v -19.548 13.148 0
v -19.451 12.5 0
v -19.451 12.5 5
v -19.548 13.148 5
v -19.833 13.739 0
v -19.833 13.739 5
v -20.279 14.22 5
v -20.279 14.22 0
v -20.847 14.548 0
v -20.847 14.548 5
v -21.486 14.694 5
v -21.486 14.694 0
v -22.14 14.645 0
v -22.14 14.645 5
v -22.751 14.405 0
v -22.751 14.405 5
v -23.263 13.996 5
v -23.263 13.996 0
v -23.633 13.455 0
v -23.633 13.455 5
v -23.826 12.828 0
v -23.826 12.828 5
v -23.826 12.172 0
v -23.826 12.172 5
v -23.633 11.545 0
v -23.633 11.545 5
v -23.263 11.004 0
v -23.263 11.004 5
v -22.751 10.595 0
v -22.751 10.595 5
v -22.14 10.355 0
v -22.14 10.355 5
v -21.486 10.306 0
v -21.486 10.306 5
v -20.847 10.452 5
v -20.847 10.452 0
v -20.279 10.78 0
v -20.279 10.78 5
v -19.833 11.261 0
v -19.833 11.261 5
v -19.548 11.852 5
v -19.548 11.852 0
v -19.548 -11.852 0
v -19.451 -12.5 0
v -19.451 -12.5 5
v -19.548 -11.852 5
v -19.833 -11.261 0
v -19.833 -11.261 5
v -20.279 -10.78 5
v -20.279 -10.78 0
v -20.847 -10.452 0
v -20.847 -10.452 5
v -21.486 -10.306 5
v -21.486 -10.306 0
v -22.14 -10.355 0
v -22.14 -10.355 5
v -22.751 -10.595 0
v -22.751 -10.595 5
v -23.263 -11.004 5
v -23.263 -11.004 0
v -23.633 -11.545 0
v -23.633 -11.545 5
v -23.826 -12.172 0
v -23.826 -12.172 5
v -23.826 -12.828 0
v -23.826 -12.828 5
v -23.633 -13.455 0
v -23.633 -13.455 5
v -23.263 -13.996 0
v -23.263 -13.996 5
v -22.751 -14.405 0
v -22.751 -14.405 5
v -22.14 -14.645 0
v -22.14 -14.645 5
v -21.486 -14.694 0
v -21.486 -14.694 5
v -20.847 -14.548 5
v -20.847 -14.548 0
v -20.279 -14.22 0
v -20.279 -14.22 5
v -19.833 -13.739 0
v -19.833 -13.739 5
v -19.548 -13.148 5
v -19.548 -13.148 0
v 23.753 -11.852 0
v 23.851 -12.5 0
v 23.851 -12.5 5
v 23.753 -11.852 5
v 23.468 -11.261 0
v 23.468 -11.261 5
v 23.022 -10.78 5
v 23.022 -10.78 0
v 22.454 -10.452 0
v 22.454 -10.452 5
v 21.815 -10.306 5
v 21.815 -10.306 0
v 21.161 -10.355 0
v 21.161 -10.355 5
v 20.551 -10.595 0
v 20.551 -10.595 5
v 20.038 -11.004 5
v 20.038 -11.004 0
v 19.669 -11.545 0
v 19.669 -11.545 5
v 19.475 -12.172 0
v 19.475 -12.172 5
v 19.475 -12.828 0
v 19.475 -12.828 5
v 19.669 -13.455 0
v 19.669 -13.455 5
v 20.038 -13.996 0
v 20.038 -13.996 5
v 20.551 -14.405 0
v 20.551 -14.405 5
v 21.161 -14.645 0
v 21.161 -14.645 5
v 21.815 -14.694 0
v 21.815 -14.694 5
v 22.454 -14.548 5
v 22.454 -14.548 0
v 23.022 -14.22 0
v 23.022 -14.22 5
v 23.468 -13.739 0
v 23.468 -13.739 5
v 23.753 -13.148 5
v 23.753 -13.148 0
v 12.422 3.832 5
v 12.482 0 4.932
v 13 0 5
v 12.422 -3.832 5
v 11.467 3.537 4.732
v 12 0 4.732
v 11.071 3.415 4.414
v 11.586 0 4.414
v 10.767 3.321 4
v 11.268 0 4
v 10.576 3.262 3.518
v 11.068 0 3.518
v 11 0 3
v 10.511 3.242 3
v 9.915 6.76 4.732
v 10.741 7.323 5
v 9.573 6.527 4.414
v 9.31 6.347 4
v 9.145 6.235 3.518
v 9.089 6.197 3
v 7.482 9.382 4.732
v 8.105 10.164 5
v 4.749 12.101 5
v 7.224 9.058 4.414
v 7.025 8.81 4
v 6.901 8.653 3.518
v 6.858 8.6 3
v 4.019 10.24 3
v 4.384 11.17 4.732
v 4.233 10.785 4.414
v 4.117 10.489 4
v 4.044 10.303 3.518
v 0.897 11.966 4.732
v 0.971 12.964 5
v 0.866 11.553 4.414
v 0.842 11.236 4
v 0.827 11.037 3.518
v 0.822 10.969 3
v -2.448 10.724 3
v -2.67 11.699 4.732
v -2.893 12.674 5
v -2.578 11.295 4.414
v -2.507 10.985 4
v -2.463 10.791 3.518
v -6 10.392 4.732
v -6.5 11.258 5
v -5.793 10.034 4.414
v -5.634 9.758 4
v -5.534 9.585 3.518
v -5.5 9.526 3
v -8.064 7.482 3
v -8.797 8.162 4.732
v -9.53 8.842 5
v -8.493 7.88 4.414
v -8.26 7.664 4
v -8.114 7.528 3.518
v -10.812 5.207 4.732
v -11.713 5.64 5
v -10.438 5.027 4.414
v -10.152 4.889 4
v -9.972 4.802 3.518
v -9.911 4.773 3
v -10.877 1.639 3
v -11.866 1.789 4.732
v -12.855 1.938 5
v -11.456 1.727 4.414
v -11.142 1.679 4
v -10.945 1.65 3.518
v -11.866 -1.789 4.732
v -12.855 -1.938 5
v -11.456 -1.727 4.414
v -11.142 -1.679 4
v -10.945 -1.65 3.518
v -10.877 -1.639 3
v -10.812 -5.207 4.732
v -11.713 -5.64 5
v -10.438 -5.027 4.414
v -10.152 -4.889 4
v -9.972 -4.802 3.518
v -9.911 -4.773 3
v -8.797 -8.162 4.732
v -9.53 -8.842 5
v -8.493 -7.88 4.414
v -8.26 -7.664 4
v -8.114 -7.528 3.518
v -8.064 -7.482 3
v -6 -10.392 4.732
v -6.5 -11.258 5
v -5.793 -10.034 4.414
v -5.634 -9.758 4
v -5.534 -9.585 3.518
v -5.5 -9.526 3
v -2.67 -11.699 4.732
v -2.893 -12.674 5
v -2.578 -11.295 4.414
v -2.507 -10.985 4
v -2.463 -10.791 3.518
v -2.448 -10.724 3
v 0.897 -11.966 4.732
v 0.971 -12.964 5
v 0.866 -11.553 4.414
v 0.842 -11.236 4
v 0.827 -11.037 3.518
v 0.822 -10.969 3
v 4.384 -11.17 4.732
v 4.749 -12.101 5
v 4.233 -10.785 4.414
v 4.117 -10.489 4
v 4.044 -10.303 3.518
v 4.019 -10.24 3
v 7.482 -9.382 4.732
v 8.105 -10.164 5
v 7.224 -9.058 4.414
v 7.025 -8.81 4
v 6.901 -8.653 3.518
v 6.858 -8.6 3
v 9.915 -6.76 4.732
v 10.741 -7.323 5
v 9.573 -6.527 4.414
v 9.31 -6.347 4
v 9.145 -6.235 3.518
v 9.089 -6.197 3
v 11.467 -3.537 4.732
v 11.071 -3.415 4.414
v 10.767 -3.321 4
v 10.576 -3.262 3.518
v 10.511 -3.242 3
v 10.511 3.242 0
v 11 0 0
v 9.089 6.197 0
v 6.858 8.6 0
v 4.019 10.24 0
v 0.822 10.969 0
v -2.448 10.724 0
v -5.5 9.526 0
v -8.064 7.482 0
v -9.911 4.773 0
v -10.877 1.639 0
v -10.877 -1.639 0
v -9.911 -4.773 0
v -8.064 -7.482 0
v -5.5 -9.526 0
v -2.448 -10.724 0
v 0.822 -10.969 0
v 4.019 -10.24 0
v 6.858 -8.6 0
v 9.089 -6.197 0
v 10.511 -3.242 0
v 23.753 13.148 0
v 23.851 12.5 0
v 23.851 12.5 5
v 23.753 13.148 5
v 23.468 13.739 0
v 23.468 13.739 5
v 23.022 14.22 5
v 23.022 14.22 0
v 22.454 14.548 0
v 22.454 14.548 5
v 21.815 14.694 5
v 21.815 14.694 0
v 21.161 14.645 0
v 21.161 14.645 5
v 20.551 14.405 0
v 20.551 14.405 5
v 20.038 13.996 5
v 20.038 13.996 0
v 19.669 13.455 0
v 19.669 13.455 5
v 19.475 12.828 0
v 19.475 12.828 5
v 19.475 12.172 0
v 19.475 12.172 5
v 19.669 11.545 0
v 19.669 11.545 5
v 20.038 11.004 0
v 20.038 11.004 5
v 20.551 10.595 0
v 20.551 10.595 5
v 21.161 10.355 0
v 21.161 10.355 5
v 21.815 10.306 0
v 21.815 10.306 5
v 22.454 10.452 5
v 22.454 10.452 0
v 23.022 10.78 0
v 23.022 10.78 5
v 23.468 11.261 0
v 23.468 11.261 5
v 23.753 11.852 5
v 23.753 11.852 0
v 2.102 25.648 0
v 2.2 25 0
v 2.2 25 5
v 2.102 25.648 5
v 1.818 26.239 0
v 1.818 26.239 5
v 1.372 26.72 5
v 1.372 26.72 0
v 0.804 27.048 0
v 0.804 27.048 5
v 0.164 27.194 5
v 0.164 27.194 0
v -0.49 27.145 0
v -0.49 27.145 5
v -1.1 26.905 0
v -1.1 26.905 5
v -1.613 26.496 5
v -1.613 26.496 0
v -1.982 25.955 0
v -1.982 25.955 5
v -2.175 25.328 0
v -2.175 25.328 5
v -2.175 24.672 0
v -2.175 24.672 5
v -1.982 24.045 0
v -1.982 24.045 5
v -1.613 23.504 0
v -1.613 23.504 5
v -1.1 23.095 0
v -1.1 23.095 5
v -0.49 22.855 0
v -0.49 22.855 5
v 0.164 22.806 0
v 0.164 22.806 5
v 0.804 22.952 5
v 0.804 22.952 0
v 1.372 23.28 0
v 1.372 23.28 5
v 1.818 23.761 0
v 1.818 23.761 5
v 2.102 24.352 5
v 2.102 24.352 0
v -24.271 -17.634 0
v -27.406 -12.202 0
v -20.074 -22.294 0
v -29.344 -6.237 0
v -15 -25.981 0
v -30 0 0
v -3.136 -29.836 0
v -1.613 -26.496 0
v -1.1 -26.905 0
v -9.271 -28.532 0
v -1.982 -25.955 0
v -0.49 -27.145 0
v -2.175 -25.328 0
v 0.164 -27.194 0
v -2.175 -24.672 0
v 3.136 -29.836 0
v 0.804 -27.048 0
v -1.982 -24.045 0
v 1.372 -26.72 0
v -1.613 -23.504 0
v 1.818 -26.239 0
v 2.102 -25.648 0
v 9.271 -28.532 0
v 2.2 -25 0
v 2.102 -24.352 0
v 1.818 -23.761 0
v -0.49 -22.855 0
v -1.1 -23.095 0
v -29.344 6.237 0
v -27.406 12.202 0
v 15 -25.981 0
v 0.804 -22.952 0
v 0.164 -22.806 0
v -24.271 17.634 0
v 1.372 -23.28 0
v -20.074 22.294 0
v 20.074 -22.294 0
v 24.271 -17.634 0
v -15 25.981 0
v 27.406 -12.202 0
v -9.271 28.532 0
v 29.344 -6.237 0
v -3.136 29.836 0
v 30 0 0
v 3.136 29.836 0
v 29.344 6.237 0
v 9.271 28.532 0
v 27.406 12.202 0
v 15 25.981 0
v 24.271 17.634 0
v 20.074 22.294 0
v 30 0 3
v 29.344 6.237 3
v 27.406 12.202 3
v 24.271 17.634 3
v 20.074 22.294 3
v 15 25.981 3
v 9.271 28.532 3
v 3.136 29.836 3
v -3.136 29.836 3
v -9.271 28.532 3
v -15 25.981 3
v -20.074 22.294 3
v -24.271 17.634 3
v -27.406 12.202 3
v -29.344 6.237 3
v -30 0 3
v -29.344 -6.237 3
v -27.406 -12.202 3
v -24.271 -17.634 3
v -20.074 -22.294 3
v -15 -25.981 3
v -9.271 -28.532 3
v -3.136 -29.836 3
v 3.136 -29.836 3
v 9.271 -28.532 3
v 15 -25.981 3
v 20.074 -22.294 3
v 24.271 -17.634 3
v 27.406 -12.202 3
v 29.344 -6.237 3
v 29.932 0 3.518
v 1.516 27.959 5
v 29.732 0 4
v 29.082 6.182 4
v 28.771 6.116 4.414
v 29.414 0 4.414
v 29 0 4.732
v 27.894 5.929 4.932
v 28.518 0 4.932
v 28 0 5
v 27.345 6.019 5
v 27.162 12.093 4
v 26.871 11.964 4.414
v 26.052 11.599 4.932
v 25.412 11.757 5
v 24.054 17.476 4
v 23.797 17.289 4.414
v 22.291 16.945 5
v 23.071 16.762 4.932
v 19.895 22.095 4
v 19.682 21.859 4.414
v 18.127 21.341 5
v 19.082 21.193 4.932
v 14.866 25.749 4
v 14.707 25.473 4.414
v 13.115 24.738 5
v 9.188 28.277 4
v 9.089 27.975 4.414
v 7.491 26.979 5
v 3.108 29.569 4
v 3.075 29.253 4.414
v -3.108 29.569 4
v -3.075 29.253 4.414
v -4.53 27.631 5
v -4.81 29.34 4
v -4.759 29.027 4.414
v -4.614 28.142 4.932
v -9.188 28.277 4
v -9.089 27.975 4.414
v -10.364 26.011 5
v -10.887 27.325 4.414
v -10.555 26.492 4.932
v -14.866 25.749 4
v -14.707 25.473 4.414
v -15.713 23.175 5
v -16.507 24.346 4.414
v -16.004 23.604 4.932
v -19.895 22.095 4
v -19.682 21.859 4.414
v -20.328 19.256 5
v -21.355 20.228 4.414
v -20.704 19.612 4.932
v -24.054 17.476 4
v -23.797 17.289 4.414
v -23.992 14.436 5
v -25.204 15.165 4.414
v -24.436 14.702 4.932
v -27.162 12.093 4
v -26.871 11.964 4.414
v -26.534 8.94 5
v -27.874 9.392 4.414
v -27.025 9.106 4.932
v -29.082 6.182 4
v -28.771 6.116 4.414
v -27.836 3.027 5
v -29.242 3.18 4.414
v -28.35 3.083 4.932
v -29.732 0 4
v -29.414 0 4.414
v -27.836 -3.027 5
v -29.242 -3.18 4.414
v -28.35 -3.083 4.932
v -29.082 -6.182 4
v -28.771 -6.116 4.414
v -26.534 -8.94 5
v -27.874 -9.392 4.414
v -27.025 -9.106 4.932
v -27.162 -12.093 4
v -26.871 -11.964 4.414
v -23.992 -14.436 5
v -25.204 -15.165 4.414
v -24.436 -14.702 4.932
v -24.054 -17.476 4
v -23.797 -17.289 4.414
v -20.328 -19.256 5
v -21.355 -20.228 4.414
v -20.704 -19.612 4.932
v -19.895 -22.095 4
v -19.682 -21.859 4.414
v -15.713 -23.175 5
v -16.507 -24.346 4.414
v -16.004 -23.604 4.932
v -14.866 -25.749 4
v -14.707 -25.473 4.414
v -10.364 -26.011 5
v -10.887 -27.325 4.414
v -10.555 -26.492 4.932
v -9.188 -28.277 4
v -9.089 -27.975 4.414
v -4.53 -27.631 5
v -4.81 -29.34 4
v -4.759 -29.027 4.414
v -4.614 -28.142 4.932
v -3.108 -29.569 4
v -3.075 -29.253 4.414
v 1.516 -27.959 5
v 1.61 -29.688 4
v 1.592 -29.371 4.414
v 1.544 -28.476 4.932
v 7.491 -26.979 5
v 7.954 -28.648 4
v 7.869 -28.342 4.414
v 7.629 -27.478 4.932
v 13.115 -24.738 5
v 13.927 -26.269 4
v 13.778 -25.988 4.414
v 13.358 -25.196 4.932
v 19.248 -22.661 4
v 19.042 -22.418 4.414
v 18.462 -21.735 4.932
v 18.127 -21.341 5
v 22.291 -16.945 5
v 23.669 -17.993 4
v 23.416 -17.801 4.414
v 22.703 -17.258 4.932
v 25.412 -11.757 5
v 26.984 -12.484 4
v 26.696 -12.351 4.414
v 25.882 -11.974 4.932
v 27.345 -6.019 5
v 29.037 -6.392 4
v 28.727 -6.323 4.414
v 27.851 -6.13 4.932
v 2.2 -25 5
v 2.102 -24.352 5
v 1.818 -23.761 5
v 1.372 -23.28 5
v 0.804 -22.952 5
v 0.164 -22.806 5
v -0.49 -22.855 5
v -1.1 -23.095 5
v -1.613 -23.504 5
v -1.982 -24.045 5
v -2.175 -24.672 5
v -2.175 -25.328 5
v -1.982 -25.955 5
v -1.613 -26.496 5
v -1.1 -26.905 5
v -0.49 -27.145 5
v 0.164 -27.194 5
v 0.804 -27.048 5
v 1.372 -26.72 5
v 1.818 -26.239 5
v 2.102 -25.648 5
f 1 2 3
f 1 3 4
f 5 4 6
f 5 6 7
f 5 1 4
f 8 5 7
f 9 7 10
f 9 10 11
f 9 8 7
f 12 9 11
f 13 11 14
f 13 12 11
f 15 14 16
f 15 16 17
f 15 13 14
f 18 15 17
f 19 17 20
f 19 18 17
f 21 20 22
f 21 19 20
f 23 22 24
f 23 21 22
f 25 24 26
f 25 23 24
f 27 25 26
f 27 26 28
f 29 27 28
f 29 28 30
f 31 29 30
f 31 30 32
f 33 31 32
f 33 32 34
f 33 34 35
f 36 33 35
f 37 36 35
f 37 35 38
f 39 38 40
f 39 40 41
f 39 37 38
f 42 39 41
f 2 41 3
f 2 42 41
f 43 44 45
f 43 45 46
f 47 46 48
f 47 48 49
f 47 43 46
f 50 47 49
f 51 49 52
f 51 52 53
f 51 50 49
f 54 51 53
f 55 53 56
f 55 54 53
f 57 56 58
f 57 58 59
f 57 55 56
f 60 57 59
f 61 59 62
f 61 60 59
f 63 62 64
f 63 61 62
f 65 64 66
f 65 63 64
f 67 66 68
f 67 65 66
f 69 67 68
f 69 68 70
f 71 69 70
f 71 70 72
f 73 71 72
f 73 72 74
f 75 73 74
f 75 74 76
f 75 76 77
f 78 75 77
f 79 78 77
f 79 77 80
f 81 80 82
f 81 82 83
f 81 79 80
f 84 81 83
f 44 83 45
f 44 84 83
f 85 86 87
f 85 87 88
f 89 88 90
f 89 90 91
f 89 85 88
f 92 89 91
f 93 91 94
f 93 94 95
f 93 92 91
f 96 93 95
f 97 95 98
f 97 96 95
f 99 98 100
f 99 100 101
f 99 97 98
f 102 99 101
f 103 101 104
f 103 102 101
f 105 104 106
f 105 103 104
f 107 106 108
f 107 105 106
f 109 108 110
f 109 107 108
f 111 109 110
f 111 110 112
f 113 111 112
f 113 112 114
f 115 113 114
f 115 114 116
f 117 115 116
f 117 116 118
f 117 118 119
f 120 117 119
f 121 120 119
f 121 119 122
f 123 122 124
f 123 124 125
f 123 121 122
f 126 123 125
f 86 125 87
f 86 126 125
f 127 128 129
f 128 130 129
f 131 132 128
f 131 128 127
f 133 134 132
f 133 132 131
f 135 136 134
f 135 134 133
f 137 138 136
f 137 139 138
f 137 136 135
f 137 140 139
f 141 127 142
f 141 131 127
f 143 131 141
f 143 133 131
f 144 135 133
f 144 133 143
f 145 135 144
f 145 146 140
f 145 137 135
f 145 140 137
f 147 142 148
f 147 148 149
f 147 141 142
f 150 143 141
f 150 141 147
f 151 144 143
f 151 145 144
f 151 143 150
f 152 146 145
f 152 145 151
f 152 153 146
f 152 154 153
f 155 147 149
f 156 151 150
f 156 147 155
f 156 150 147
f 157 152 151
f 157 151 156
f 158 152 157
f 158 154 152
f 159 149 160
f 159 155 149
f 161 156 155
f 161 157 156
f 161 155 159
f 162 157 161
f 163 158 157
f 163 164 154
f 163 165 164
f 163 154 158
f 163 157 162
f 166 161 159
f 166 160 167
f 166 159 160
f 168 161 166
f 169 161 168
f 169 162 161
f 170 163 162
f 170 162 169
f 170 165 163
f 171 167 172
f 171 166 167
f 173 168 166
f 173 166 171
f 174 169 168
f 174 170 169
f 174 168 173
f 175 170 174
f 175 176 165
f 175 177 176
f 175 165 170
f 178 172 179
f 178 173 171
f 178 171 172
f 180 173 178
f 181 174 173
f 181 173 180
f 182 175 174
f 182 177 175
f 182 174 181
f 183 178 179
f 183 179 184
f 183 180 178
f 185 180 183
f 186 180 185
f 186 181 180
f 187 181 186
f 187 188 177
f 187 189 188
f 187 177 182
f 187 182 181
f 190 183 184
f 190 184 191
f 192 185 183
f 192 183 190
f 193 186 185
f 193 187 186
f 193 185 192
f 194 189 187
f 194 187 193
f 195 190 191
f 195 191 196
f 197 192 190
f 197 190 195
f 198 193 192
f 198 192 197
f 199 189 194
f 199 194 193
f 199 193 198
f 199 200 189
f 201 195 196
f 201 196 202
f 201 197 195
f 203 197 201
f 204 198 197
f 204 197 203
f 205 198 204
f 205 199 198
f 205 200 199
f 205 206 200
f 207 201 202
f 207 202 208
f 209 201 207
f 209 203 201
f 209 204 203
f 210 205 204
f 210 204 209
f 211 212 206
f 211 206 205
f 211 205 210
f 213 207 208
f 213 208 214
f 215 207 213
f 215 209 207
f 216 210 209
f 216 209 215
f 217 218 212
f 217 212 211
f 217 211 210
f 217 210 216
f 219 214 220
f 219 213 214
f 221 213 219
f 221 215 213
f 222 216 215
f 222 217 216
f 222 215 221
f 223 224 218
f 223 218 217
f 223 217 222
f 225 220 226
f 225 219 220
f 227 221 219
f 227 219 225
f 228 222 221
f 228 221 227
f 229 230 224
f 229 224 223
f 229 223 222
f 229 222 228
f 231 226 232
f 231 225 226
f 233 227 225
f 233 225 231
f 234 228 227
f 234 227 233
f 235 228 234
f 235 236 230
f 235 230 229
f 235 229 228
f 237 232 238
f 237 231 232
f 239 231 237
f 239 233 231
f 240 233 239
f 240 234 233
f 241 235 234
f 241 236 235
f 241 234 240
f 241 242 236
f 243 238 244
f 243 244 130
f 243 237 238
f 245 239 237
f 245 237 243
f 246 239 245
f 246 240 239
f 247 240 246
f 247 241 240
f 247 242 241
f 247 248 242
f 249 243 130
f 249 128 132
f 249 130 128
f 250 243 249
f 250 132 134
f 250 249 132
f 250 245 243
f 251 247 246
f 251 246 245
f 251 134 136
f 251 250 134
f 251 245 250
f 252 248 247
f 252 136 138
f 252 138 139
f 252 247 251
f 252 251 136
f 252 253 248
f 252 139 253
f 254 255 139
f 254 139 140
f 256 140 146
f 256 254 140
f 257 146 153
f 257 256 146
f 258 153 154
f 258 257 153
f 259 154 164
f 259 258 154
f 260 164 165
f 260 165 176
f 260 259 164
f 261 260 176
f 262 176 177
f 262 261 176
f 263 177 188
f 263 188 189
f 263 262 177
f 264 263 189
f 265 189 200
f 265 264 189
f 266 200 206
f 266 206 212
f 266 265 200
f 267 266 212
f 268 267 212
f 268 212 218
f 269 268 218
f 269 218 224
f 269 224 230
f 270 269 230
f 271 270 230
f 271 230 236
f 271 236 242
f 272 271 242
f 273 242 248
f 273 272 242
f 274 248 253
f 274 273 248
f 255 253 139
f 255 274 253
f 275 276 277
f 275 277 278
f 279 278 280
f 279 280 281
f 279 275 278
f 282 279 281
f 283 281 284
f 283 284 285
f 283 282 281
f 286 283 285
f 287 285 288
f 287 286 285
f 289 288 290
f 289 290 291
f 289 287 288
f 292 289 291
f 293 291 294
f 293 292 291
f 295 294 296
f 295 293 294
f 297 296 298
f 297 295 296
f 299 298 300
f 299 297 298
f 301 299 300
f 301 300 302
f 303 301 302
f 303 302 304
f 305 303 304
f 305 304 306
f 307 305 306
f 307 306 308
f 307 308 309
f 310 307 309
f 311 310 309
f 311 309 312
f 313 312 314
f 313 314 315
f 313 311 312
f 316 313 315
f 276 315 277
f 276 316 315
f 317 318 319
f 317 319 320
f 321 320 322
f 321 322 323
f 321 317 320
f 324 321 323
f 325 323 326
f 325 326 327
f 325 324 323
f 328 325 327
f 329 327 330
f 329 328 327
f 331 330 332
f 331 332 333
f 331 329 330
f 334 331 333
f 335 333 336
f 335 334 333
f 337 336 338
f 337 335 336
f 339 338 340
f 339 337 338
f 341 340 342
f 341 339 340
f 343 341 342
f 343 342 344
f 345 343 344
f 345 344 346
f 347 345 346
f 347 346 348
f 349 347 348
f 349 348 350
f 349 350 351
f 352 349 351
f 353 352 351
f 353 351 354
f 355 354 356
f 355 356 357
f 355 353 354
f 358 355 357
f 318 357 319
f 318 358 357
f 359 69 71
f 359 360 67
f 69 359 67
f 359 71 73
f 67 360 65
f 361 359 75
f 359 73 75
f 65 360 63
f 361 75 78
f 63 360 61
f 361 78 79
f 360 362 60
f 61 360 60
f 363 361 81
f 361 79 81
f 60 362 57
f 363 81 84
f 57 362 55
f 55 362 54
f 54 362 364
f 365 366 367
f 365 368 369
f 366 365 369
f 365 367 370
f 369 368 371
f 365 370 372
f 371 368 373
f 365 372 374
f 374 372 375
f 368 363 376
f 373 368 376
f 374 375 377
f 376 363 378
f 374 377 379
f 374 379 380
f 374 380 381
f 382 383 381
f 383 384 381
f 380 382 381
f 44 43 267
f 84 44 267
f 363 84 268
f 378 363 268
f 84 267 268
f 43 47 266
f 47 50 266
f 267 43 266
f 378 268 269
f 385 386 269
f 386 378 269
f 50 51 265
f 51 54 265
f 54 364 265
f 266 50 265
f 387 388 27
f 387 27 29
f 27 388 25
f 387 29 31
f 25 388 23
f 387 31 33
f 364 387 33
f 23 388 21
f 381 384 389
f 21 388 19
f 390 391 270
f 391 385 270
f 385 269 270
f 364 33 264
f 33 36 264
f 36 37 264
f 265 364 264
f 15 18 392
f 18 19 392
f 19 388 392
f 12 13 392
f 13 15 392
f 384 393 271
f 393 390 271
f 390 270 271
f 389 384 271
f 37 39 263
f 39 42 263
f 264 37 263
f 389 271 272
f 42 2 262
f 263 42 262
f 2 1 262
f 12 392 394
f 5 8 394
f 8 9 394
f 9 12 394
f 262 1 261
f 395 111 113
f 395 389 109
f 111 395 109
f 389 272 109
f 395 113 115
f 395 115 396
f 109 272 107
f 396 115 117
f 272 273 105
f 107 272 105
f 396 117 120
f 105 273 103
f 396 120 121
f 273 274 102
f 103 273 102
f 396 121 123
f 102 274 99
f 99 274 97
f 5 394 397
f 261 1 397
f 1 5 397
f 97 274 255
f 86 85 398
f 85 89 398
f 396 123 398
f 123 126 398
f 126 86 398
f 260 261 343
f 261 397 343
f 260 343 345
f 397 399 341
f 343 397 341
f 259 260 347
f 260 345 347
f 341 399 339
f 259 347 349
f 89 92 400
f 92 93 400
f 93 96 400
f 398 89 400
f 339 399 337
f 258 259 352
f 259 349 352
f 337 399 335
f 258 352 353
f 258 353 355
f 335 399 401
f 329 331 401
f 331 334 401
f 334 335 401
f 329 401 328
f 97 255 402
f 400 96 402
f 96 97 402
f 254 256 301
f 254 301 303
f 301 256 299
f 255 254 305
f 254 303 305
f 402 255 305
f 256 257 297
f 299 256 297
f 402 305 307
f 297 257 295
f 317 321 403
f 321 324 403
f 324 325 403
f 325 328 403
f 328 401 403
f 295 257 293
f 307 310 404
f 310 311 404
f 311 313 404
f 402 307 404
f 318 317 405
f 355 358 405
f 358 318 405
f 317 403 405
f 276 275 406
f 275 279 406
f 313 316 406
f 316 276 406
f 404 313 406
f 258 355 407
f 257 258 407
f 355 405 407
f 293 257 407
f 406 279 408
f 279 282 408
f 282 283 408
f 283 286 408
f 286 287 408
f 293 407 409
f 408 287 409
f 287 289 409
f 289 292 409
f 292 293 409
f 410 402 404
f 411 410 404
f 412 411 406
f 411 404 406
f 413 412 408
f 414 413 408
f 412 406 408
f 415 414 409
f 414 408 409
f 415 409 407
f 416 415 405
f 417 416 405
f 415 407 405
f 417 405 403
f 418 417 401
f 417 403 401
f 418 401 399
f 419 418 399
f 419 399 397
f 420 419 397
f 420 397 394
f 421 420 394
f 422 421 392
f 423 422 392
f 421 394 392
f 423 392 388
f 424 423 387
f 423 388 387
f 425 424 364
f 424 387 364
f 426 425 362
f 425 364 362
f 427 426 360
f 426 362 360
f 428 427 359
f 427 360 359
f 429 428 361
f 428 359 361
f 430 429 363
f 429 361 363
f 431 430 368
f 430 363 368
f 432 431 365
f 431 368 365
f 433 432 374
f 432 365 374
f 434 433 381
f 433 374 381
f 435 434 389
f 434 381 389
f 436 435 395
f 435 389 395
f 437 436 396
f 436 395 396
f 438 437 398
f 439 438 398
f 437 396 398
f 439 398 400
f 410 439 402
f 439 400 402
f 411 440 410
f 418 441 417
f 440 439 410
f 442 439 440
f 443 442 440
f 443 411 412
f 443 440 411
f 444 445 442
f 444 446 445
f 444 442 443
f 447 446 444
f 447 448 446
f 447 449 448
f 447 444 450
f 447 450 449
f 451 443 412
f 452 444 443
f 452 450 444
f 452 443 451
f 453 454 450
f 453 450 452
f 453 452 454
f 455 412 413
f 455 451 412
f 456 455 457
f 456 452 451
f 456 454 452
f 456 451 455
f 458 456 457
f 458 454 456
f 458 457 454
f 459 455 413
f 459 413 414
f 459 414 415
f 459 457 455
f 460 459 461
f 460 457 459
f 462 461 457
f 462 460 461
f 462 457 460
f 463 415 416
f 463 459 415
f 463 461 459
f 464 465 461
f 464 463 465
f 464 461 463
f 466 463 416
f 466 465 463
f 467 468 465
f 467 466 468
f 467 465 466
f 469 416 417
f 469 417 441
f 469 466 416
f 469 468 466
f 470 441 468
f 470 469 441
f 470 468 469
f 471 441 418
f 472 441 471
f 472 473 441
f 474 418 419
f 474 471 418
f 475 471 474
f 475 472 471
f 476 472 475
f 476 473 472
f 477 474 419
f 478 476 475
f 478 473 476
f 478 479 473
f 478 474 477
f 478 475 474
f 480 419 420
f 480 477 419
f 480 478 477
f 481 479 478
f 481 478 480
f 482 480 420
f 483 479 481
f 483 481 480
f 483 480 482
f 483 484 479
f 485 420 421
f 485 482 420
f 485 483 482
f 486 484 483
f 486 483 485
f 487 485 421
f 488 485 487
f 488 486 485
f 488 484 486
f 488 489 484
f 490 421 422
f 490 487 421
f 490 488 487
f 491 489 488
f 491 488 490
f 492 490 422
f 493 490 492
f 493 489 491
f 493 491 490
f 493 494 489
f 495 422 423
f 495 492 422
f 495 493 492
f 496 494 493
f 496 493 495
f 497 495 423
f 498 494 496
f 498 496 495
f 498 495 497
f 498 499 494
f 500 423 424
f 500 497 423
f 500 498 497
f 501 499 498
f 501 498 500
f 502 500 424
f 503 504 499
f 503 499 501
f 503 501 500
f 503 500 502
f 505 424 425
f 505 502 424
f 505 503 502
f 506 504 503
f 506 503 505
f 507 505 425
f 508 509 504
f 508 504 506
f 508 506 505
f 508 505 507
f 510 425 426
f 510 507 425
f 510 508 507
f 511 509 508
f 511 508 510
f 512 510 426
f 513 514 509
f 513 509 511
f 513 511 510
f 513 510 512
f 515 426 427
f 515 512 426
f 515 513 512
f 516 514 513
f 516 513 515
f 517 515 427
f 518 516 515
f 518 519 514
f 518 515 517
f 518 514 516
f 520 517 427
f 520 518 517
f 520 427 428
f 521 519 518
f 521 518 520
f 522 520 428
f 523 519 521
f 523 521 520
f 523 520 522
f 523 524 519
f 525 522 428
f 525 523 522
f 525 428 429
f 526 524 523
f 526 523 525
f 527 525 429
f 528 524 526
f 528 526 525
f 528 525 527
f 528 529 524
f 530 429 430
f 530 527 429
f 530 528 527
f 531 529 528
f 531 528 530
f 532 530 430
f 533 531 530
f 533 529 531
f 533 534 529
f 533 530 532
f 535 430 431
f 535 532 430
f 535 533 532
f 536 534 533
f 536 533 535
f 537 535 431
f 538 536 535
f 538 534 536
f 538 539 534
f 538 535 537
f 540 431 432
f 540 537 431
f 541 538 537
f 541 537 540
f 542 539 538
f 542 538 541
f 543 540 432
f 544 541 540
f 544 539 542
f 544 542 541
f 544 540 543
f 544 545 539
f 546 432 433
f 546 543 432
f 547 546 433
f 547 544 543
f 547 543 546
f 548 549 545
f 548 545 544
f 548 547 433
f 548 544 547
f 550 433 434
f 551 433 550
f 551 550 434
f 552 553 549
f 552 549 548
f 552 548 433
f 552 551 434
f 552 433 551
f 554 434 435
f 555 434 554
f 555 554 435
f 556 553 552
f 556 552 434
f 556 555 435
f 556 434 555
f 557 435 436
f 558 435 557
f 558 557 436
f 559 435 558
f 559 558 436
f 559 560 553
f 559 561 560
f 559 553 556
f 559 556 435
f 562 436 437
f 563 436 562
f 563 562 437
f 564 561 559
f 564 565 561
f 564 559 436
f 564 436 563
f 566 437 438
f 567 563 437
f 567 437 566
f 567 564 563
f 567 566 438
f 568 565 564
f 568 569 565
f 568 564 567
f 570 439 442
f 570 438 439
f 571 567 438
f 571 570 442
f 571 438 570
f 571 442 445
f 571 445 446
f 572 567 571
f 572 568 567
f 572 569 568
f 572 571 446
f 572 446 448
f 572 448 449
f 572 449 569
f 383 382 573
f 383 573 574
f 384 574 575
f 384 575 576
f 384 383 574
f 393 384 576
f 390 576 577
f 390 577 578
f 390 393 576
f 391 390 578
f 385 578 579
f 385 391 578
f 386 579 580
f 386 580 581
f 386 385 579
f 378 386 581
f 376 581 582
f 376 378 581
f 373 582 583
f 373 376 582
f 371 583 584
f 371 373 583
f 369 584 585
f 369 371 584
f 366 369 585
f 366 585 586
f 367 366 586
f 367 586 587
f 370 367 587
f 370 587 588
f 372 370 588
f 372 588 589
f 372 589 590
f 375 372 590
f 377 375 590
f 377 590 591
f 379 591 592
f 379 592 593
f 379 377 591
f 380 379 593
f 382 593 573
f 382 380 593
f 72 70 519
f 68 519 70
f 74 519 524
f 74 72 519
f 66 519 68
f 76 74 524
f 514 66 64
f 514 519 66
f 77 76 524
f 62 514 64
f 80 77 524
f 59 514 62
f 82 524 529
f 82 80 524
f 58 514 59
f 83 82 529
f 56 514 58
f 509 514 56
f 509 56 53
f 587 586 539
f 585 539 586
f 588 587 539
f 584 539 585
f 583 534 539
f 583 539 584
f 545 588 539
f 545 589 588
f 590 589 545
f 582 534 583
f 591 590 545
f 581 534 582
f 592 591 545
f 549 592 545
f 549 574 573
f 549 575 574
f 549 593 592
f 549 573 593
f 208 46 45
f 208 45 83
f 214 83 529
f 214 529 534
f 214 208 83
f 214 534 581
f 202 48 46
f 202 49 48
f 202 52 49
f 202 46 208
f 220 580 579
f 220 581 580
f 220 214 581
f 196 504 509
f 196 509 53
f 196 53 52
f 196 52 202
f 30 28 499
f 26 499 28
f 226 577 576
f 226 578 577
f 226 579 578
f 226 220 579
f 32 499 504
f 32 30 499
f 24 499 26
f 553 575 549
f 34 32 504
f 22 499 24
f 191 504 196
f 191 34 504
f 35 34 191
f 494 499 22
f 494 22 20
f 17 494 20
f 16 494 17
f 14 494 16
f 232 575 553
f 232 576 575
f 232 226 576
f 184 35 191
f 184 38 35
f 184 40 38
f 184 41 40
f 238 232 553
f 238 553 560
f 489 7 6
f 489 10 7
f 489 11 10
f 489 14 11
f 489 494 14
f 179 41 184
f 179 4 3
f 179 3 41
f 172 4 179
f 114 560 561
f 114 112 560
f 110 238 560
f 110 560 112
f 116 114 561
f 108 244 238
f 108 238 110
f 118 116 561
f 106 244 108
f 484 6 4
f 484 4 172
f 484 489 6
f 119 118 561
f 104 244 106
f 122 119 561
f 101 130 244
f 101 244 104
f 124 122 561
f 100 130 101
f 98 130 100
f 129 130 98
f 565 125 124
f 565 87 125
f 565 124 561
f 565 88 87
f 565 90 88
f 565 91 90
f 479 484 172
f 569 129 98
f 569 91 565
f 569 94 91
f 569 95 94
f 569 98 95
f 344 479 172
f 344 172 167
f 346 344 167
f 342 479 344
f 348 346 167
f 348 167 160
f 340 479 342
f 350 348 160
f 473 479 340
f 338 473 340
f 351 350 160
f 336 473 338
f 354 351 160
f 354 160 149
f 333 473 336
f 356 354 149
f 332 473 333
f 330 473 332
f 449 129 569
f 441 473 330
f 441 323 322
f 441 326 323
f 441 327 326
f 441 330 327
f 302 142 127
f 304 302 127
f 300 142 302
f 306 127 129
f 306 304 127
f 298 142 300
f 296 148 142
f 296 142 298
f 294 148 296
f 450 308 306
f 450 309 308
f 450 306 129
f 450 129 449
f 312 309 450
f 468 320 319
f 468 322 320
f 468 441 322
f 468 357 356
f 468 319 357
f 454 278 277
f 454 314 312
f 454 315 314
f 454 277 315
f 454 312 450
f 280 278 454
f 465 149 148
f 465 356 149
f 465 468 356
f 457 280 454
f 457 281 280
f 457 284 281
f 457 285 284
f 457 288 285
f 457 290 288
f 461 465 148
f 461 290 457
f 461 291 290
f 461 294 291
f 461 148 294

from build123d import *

# Parameters (mm, degrees)
F0_R     = 30
F0_R_2   = 2.2
F0_R_3   = 11
F1_DEPTH = 5
F2_R     = 2
F3_R     = 2


with BuildPart() as f1:
    # F0 (on Top) → F1 (new body)
    with BuildSketch(Plane.XY):
        Circle(F0_R)
        with Locations((-21.650635, -12.5)):
            Circle(F0_R_2, mode=Mode.SUBTRACT)
        with Locations((0, -25)):
            Circle(F0_R_2, mode=Mode.SUBTRACT)
        with Locations((21.650635, -12.5)):
            Circle(F0_R_2, mode=Mode.SUBTRACT)
        with Locations((-21.650635, 12.5)):
            Circle(F0_R_2, mode=Mode.SUBTRACT)
        Circle(F0_R_3, mode=Mode.SUBTRACT)
        with Locations((21.650635, 12.5)):
            Circle(F0_R_2, mode=Mode.SUBTRACT)
        with Locations((0, 25)):
            Circle(F0_R_2, mode=Mode.SUBTRACT)
    extrude(amount=F1_DEPTH)

    # F2
    f2_edges = [f1.edges().sort_by_distance(p)[0] for p in [
        (-30, 0, 5),
    ]]
    fillet(f2_edges, radius=F2_R)

    # F3
    f3_edges = [f1.edges().sort_by_distance(p)[0] for p in [
        (-11, 0, 5),
    ]]
    fillet(f3_edges, radius=F3_R)


solid = f1.part
